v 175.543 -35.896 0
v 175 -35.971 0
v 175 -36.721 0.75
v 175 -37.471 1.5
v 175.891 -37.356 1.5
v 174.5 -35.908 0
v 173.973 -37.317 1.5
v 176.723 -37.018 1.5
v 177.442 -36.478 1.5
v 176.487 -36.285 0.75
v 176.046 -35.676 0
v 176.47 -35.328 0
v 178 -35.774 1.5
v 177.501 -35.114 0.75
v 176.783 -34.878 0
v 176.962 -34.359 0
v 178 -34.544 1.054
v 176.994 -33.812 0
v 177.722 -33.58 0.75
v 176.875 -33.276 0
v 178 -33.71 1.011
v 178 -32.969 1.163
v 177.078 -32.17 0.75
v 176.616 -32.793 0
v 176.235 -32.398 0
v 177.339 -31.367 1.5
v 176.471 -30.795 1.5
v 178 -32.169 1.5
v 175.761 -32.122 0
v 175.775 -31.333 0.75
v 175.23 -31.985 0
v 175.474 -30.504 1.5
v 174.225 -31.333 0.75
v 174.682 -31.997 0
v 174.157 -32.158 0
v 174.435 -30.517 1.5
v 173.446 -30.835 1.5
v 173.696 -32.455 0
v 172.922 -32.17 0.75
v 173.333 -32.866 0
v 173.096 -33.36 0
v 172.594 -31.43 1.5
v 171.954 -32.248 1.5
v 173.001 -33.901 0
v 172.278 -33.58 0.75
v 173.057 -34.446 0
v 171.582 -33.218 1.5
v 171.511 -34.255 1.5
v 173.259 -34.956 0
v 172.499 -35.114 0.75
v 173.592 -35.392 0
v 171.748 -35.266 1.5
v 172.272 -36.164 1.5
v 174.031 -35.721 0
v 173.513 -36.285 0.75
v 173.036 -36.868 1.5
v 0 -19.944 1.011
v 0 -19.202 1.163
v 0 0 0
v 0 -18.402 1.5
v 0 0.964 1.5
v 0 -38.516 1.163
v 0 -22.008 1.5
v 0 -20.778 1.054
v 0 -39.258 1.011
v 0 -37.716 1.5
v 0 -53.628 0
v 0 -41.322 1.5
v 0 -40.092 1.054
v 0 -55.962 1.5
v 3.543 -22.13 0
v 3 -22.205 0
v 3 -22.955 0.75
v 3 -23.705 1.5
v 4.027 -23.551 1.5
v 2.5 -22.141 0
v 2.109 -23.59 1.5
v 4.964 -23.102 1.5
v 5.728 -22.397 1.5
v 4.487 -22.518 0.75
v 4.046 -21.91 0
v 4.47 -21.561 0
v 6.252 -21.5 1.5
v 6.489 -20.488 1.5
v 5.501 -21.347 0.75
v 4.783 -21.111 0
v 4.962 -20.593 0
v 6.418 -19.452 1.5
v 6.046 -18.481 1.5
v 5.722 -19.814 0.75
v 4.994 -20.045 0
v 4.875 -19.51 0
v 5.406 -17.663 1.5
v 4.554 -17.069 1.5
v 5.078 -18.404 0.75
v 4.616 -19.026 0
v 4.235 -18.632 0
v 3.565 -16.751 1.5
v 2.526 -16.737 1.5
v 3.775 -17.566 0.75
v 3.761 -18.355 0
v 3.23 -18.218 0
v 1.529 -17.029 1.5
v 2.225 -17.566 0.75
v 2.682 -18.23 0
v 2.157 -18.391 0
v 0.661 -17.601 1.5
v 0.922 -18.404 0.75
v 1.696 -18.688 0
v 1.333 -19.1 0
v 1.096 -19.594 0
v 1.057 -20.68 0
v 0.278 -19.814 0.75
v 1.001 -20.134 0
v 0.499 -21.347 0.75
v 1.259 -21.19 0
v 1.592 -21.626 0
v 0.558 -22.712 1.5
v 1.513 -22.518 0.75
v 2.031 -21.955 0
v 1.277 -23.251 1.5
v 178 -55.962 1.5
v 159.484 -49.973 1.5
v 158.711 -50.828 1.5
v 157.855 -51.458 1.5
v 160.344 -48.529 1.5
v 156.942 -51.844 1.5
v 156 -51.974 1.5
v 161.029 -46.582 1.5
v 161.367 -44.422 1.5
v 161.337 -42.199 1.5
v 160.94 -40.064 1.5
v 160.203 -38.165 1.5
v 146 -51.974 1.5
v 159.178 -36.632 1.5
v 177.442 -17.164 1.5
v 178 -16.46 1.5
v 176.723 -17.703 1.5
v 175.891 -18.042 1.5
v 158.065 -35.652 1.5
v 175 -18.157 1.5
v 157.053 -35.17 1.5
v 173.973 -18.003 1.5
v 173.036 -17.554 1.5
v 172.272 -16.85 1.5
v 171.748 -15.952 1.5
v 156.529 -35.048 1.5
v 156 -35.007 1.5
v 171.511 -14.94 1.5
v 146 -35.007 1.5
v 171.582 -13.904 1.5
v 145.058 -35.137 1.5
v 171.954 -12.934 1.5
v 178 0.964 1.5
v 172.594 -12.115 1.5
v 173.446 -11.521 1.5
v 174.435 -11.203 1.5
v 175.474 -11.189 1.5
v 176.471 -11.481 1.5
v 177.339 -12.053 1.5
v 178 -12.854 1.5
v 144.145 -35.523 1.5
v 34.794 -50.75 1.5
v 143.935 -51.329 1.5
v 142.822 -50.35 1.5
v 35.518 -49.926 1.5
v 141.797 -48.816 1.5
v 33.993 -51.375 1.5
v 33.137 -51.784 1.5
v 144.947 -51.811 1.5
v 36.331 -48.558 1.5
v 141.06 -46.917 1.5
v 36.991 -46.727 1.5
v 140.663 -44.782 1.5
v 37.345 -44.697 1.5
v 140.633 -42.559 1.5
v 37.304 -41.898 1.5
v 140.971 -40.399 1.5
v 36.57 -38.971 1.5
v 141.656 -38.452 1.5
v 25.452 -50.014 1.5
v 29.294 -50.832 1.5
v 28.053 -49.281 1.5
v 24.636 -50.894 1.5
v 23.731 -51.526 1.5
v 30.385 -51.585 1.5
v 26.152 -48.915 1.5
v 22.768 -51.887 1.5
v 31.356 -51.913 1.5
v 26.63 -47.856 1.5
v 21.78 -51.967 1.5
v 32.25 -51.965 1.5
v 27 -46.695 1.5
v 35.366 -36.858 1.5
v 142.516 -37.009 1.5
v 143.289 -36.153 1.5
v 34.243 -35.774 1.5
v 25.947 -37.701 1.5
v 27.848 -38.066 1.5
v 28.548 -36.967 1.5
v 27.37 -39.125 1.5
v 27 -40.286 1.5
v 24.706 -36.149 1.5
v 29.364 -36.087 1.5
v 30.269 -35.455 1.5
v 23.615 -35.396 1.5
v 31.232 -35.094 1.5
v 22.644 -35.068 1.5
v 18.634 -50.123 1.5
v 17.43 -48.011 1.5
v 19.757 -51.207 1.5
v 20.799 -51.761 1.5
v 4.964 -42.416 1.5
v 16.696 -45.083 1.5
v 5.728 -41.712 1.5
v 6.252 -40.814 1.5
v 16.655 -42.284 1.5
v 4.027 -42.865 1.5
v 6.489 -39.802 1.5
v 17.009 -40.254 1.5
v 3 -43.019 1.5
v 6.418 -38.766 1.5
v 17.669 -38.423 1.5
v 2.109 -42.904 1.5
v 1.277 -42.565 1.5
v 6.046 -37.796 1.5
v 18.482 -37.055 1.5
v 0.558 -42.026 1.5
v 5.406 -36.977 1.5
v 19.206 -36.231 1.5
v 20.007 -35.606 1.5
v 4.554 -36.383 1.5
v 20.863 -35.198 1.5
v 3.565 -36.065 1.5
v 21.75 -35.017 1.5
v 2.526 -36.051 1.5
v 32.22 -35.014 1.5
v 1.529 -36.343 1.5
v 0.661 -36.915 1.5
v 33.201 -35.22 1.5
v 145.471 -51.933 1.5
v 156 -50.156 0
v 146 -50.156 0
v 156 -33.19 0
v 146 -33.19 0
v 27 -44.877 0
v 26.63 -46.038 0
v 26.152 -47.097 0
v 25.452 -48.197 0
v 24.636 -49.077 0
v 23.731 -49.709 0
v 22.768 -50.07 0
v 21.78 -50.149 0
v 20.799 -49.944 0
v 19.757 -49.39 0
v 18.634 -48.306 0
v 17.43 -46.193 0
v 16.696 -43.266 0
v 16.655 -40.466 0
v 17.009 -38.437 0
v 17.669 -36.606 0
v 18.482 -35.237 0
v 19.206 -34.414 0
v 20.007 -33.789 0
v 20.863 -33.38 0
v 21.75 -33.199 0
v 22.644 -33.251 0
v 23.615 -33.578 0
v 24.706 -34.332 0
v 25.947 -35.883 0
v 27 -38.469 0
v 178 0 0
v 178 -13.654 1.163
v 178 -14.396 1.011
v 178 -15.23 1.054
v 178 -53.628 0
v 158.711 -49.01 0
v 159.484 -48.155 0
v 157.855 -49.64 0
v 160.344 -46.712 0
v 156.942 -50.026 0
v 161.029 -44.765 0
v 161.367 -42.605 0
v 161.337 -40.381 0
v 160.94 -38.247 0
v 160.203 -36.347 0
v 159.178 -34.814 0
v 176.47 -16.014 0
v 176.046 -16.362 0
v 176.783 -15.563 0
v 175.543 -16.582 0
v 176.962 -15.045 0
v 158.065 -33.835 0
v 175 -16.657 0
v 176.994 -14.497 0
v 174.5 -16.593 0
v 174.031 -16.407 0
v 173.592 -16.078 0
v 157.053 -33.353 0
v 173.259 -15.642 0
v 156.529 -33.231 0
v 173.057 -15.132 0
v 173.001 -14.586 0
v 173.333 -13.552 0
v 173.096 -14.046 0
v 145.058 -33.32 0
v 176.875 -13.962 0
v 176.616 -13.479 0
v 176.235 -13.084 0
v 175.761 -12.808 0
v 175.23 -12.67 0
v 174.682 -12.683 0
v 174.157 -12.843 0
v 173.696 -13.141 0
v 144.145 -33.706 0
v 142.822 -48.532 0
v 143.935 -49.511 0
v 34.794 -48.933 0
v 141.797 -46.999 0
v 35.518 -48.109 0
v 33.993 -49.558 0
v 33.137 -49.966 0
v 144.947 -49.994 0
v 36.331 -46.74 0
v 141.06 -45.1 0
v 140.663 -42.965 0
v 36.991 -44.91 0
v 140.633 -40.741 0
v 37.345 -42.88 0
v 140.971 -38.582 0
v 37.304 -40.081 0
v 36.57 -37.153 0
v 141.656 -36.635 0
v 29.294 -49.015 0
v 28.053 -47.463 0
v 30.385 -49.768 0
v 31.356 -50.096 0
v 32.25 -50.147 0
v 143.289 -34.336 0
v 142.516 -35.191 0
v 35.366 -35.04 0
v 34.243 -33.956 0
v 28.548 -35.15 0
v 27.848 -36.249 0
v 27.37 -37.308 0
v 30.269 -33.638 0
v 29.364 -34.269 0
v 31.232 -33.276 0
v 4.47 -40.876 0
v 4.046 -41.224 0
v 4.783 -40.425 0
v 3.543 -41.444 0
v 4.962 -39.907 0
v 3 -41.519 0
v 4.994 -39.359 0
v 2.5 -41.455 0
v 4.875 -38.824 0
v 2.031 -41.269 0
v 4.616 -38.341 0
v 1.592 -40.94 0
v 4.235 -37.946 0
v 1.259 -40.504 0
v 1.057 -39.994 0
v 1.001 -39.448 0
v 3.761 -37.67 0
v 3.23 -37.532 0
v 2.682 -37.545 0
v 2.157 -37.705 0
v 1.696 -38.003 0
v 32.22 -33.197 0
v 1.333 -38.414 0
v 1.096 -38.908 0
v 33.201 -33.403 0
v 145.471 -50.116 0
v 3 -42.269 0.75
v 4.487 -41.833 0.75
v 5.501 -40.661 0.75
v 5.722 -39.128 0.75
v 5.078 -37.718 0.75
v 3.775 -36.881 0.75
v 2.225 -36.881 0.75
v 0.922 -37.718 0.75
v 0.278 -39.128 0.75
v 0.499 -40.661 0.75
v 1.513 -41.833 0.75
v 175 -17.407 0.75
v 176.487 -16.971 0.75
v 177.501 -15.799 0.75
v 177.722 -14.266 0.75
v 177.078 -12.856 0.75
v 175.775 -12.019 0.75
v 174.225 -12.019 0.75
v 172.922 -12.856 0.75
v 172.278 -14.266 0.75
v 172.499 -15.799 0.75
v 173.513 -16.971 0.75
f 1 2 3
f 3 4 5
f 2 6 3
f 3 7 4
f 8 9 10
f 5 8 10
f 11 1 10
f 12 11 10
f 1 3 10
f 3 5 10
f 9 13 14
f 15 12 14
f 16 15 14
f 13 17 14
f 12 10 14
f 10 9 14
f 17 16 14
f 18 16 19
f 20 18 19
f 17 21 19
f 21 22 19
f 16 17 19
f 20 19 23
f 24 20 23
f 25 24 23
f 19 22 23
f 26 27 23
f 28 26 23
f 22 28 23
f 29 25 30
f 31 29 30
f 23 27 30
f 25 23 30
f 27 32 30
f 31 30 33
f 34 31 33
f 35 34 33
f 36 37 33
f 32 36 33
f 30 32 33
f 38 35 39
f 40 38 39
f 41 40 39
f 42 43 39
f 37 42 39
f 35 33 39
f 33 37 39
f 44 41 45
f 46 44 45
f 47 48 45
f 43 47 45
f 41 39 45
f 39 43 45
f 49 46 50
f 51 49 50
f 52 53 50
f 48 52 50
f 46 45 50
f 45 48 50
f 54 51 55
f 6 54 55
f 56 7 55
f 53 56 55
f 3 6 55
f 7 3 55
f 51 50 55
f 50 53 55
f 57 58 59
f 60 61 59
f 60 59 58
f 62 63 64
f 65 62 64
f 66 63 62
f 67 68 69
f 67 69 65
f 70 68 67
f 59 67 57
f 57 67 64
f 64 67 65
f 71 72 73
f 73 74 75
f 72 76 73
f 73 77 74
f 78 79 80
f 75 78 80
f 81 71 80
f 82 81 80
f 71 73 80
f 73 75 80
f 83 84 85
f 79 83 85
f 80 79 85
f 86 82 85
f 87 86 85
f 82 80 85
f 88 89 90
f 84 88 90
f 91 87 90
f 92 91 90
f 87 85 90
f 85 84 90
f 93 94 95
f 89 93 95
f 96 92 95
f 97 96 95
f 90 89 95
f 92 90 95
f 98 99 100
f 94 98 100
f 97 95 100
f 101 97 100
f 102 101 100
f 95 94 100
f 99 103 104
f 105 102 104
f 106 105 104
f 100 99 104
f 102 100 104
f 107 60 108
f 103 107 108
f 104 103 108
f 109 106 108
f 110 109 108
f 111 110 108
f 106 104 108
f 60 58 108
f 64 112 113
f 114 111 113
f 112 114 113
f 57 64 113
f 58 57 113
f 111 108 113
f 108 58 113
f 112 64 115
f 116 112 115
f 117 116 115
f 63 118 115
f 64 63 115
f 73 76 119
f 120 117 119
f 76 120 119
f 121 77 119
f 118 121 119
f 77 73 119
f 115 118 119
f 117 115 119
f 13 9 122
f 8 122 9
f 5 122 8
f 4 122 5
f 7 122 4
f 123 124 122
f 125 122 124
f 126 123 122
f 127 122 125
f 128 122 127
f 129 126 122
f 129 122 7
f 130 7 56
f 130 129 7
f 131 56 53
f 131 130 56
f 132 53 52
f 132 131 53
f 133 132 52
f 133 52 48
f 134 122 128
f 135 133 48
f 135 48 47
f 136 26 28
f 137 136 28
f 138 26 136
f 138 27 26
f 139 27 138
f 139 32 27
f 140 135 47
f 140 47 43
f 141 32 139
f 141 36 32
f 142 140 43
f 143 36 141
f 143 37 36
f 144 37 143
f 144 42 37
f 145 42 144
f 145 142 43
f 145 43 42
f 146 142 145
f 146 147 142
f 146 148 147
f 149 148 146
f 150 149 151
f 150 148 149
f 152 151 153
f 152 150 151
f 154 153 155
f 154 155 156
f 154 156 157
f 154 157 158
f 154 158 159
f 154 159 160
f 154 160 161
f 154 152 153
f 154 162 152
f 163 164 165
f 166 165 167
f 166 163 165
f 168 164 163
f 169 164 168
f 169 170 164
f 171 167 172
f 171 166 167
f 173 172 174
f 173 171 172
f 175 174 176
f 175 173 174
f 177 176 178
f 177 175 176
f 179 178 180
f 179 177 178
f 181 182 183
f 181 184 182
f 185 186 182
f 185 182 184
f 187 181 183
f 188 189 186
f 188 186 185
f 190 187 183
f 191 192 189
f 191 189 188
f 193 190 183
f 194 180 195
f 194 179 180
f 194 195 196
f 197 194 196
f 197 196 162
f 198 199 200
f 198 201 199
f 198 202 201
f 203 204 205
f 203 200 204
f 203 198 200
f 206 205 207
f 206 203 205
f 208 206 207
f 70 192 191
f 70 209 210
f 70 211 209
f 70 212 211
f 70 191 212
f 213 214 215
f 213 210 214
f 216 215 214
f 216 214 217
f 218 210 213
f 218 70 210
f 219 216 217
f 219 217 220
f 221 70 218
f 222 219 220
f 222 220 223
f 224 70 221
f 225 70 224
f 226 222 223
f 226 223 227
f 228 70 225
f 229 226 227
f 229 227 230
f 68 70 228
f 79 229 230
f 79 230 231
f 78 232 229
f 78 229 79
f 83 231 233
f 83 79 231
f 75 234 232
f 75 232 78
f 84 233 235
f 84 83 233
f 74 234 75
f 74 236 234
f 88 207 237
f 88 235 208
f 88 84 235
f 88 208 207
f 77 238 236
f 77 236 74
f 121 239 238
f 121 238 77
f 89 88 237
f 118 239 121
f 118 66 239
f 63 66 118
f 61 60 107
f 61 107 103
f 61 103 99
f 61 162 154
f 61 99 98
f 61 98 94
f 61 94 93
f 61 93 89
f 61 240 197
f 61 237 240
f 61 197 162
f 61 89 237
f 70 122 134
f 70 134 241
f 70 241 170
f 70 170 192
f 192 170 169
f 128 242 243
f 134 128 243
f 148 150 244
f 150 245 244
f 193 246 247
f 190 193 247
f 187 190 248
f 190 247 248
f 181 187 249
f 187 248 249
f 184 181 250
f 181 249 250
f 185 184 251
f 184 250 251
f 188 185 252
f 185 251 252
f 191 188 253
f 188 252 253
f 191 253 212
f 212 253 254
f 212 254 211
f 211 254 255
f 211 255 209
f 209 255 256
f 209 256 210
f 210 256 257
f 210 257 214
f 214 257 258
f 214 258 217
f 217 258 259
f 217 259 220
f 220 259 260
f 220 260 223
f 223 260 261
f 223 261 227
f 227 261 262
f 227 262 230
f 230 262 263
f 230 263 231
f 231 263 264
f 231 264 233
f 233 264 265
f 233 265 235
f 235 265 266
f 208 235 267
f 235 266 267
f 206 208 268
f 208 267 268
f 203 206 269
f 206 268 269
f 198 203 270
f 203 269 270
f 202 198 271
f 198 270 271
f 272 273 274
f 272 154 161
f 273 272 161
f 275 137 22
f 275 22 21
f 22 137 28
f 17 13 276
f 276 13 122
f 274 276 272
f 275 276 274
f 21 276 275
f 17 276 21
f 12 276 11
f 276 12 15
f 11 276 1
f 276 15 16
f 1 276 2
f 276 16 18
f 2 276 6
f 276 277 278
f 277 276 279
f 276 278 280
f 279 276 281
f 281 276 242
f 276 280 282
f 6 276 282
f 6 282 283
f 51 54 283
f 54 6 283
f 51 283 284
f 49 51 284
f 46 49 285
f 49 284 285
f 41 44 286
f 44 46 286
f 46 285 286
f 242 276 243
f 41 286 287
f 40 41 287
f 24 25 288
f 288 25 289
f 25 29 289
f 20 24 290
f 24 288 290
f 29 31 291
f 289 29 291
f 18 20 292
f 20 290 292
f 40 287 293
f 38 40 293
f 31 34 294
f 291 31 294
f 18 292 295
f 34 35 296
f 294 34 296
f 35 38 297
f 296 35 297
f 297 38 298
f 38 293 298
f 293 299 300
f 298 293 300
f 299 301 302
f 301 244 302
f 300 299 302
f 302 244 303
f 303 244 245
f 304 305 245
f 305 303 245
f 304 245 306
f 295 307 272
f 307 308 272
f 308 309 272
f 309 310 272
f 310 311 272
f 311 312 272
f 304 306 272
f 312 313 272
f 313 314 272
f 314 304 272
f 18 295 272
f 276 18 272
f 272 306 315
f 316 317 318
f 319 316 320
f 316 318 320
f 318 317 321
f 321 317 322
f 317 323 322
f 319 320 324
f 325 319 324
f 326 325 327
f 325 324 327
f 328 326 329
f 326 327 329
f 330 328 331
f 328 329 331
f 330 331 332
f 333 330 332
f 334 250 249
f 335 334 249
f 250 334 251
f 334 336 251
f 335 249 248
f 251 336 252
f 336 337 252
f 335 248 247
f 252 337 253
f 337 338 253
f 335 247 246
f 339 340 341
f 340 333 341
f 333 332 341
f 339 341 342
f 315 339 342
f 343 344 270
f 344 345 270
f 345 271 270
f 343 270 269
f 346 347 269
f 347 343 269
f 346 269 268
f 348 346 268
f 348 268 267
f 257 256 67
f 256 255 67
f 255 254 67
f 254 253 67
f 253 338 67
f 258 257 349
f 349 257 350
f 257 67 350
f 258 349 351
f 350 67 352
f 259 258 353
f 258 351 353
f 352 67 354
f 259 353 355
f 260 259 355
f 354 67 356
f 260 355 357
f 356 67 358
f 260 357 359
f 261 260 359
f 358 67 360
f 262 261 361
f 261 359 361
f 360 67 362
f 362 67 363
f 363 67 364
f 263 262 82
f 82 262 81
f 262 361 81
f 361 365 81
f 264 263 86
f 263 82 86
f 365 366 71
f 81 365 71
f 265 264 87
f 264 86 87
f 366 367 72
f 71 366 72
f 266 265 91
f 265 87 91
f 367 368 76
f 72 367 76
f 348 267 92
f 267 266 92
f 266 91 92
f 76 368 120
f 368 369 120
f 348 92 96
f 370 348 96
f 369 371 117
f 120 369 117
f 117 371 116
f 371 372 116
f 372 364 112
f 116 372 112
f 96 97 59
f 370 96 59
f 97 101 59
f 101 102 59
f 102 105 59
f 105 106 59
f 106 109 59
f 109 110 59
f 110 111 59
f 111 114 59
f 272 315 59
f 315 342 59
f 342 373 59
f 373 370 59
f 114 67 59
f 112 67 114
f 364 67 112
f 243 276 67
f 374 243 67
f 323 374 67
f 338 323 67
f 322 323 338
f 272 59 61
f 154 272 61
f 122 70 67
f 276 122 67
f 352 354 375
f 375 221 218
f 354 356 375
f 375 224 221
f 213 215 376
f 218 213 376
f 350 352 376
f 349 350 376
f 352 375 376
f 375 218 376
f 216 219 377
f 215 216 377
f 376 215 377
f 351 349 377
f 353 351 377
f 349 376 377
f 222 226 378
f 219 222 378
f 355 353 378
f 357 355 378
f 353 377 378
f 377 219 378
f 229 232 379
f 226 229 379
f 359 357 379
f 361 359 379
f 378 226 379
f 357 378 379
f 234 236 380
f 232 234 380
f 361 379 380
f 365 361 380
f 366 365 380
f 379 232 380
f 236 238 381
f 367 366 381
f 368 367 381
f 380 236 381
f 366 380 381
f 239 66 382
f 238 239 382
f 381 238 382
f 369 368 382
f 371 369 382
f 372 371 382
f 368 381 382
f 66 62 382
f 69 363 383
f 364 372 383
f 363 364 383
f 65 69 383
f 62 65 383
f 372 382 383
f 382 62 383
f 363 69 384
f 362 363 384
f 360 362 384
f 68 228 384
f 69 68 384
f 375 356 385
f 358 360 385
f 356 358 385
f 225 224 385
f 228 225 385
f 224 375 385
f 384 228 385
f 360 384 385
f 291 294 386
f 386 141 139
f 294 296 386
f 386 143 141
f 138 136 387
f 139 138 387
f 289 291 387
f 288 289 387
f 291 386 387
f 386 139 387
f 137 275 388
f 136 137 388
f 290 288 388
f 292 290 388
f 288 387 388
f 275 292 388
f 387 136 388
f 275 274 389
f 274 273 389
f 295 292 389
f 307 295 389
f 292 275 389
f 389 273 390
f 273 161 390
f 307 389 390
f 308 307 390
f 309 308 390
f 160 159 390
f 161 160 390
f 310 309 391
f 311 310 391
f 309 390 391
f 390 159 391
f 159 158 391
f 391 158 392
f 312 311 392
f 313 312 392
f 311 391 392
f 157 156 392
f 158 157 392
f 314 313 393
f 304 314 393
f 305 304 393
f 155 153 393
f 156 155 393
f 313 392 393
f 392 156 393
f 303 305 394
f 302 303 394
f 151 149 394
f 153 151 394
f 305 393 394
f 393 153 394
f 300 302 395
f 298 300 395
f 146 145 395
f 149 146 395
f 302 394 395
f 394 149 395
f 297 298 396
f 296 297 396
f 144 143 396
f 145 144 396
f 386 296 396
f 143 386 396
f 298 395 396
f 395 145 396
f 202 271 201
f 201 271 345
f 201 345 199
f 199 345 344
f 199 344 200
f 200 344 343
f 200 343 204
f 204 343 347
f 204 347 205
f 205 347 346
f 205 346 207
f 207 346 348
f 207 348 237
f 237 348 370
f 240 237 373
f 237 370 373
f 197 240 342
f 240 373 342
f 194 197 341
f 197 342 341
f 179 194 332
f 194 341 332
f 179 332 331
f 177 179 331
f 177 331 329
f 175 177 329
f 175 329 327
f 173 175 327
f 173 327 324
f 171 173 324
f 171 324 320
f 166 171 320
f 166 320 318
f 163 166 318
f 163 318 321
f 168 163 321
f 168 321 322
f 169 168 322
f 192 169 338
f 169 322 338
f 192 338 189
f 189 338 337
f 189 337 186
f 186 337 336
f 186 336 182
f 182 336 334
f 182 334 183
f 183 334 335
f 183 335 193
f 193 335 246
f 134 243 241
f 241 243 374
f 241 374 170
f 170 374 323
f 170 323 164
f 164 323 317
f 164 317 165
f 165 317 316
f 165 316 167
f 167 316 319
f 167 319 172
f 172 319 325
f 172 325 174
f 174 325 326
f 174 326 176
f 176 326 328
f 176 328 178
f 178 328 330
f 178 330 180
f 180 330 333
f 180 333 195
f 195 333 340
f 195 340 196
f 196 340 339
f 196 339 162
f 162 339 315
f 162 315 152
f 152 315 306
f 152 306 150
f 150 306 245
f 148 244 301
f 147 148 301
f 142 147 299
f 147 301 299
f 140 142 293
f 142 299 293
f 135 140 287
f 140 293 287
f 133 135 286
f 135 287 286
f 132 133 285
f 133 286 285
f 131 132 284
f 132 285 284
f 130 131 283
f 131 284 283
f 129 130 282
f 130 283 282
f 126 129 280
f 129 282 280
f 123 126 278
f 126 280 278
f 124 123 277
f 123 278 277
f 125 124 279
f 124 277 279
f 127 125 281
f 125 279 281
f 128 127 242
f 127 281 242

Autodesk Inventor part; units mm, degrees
ref_plane "YZ Plane" through (0, 0, 0) normal (1, 0, 0) x (0, 1, 0)
ref_plane "XZ Plane" through (0, 0, 0) normal (0, 1, 0) x (-1, 0, 0)
ref_plane "Work Plane1" through (0, 4.7283, -22.9522) normal (-1, 0, 0) x (0, -0.8411785, 0.5407576)
sketch "Sketch1" plane through (0, 4.7283, -22.9522) normal (-1, 0, 0) x (0, -0.8411785, 0.5407576)
  line L0 (61.5, -12.25) -> (61.5, -16.75) projected
  line L1 (61.5, -16.75) -> (65.5, -16.75) projected
  line L2 (65.5, -16.75) -> (65.5, -20.25) projected
  line L3 (65.5, -20.25) -> (79.5, -20.25) projected
  line L4 (79.5, -20.25) -> (65.5, -11.25) projected
  line L5 (65.5, -11.25) -> (65.5, -12.25) projected
  line L6 (65.5, -12.25) -> (61.5, -12.25) projected
  line L7 (16.3889, 16.75) -> (16.3889, 18.75) projected
  line L8 (14.7421, 12.75) -> (16.3889, 18.75)
  line L9 (64.2739, -12.25) -> (12.3502, 21.1295)
  line L10 (16.3889, 16.75) -> (16.3889, 18.5332)
  arc A0 (-57.551, -16.75) -> (-61.5, -12.801) centre (-58.75, -14) ccw projected
  arc A1 (-34.301, -16.75) -> (-36.699, -16.75) centre (-35.5, -14) ccw projected
  line L11 (61.5, -12.25) -> (16.3889, 16.75) projected
  line L12 (16.3889, 13.75) -> (-61.5, 13.75) projected
  line L13 (-61.5, 13.75) -> (-61.5, -12.801) projected
  line L14 (-61.5, 13.75) -> (-61.5, -12.801) projected
  arc A2 (-57.551, -16.75) -> (-61.5, -12.801) centre (-58.75, -14) ccw projected
  line L15 (-57.551, -16.75) -> (-36.699, -16.75) projected
  arc A3 (-34.301, -16.75) -> (-36.699, -16.75) centre (-35.5, -14) ccw projected
  line L16 (-34.301, -16.75) -> (61.5, -16.75) projected
  line L17 (61.5, -16.75) -> (61.5, -12.25) projected
  line L18 (21.0556, 13.75) -> (-61.5, 13.75) projected
  line L19 (-57.551, -16.75) -> (-36.699, -16.75) projected
  line L20 (-34.301, -16.75) -> (61.5, -16.75) projected
  line L21 (61.5, -16.75) -> (61.5, -12.25) projected
  line L22 (61.5, -12.25) -> (21.0556, 13.75) projected
  point P0 (16.3889, 18.5332)
  point P1 (15.5655, 15.75)
  point P2 (16.3889, 18.5332)
  point P3 (16.3383, 18.5657)
  dimension "d14" = 1.5
  dimension "d15" = 2
ref_plane "Work Plane2" through (178, -56.0619, -70.2985) normal (1, 0, 0) x (0, 0.8411785, -0.5407576)
extrude "Extrusion1" add sketch "Sketch1" against normal up to surface (178 mm away) contours L11 L7 L9 L6
sketch "Sketch2" plane through (0, -55.9618, 1.5) normal (0, 0, 1) x (1, 0, 0)
  circle A0 centre (3, 16.4427) radius 2.5 projected
  circle A1 centre (3, 35.7569) radius 2.5 projected
  line L0 (0, 2.3333) -> (0, 55.9618) projected
  line L1 (0, 2.3333) -> (3, 2.3333) projected
  line L2 (6, 50.414) -> (6, 9.4662) projected
  line L3 (0, 50.414) -> (6, 50.414) projected
  circle A2 centre (175, 21.9904) radius 2.5 projected
  circle A3 centre (175, 41.3047) radius 2.5 projected
  line L4 (178, 2.3333) -> (178, 55.9618) projected
  line L5 (178, 55.9618) -> (172, 55.9618) projected
  line L6 (172, 55.9618) -> (172, 2.3333) projected
  line L7 (178, 2.3333) -> (172, 2.3333) projected
  line L8 (3, 9.4662) -> (3, 2.3333) projected
  line L9 (3, 9.4662) -> (6, 9.4662) projected
  point P0 (3, 35.7569)
  point P1 (3, 16.4427)
hole "Hole1" at (3, -20.2049, 1.5) at (3, -39.5191, 1.5) at (175, -33.9713, 1.5) at (175, -14.6571, 1.5) direction (0, 0, -1) diameter 3.6 end through all countersink diameter 7 countersink angle 90 clearance for "Countersunk Flat Head Screw ISO 2009/7046" size "M3" standard "ISO"
ref_plane "Work Plane3" through (22, -31.0502, -8.6656) normal (0, -0.7712334, 0.6365525) x (1, 0, 0)
sketch "Sketch3" plane through (22, -31.0502, -8.6656) normal (0, -0.7712334, 0.6365525) x (1, 0, 0)
  line L0 (-9.9215, 5.3729) -> (-9.9215, -5.5323)
  spline S0 degree 3 poles (-9.9215, -5.5323) (-9.9222, -5.6561) (-9.8204, -5.8999) (-9.5772, -6.0011) (-9.4534, -6.0004) knots 0 0 0 0 0.5 1 1 1 1
  line L1 (-9.4534, -6.0004) -> (19.4534, -6.0004)
  spline S1 degree 3 poles (19.4534, -6.0004) (19.5775, -6.0011) (19.8219, -5.8989) (19.9222, -5.6548) (19.9215, -5.5307) knots 0 0 0 0 0.5 1 1 1 1
  line L2 (19.9215, -5.5307) -> (19.9215, 5.3744)
  spline S2 degree 3 poles (19.9215, 5.3744) (19.9222, 5.4985) (19.82, 5.743) (19.5758, 5.8433) (19.4518, 5.8426) knots 0 0 0 0 0.5 1 1 1 1
  line L3 (19.4518, 5.8426) -> (-9.4534, 5.8426)
  spline S3 degree 3 poles (-9.4534, 5.8426) (-9.5775, 5.8433) (-9.8219, 5.7411) (-9.9222, 5.4969) (-9.9215, 5.3729) knots 0 0 0 0 0.5 1 1 1 1
  circle A0 centre (-8.3791, -4.458) radius 0.5
  circle A1 centre (-8.3791, 4.3001) radius 0.5
  circle A2 centre (18.3791, 4.3001) radius 0.5
  circle A3 centre (18.3791, -4.458) radius 0.5
  arc A4 (5.2617, -1.5301) -> (5.1811, -1.6008) centre (5.2771, -1.6289) ccw
  arc A5 (5.1811, 1.4429) -> (5.1811, -1.6008) centre (0, -0.0789) ccw
  arc A6 (5.1811, 1.4429) -> (5.2617, 1.3723) centre (5.2771, 1.4711) ccw
  arc A7 (5.2617, 1.3723) -> (5.3414, 1.4401) centre (5.2463, 1.4711) ccw
  arc A8 (5.3414, -1.5979) -> (5.3414, 1.4401) centre (10, -0.0789) ccw
  arc A9 (5.3414, -1.5979) -> (5.2617, -1.5301) centre (5.2463, -1.6289) ccw
  line L4 (143.9215, 5.3729) -> (143.9215, -5.5323)
  spline S4 degree 3 poles (143.4534, 5.8426) (143.5775, 5.8433) (143.8219, 5.7411) (143.9222, 5.4969) (143.9215, 5.3729) knots 0 0 0 0 0.5 1 1 1 1
  line L5 (114.5482, 5.8426) -> (143.4534, 5.8426)
  spline S5 degree 3 poles (114.0785, 5.3744) (114.0778, 5.4985) (114.18, 5.743) (114.4242, 5.8433) (114.5482, 5.8426) knots 0 0 0 0 0.5 1 1 1 1
  line L6 (114.0785, -5.5307) -> (114.0785, 5.3744)
  spline S6 degree 3 poles (114.5466, -6.0004) (114.4225, -6.0011) (114.1781, -5.8989) (114.0778, -5.6548) (114.0785, -5.5307) knots 0 0 0 0 0.5 1 1 1 1
  line L7 (143.4534, -6.0004) -> (114.5466, -6.0004)
  spline S7 degree 3 poles (143.9215, -5.5323) (143.9222, -5.6561) (143.8204, -5.8999) (143.5772, -6.0011) (143.4534, -6.0004) knots 0 0 0 0 0.5 1 1 1 1
  circle A10 centre (142.3791, -4.458) radius 0.5
  circle A11 centre (142.3791, 4.3001) radius 0.5
  circle A12 centre (115.6209, 4.3001) radius 0.5
  circle A13 centre (115.6209, -4.458) radius 0.5
  arc A14 (128.8189, -1.6008) -> (128.7383, -1.5301) centre (128.7229, -1.6289) ccw
  arc A15 (128.7383, -1.5301) -> (128.6586, -1.5979) centre (128.7537, -1.6289) ccw
  arc A16 (128.6586, 1.4401) -> (128.6586, -1.5979) centre (124, -0.0789) ccw
  arc A17 (128.6586, 1.4401) -> (128.7383, 1.3723) centre (128.7537, 1.4711) ccw
  arc A18 (128.7383, 1.3723) -> (128.8189, 1.4429) centre (128.7229, 1.4711) ccw
  arc A19 (128.8189, -1.6008) -> (128.8189, 1.4429) centre (134, -0.0789) ccw
  circle A20 centre (10, -0.0789) radius 5.4
  circle A21 centre (124, -0.0789) radius 5.4
  line L8 (0, 5.3211) -> (10, 5.3211)
  line L9 (10, -5.4789) -> (0, -5.4789)
  line L10 (124, 5.3211) -> (134, 5.3211)
  line L11 (134, -5.4789) -> (124, -5.4789)
  point P0 (-22, 26.4483)
  point P1 (14.6373, -1.6617)
  point P2 (5, 1.9607)
  point P3 (5.3627, -1.6617)
  point P4 (5, -2.1185)
  point P5 (7.5029, -4.2949)
  point P6 (3.3743, -4.2949)
  point P7 (5.2923, -1.5401)
  dimension "d9" = 10.8
  dimension "d10" = 10.8
extrude "Extrusion2" cut sketch "Sketch3" along normal blind 78.25 contours A9 A8 A7 A6 A5 A20 A4 | A4 A5 A20 A6 A7 A8 A9 | A5 A20 | A19 A21 A18 A17 A16 A15 A14 | A14 A15 A16 A17 A18 A19 A21 | A21 A19 | A19 L11 A21 | A19 A21 L10
properties part number "front" material "Aluminum 6061"
